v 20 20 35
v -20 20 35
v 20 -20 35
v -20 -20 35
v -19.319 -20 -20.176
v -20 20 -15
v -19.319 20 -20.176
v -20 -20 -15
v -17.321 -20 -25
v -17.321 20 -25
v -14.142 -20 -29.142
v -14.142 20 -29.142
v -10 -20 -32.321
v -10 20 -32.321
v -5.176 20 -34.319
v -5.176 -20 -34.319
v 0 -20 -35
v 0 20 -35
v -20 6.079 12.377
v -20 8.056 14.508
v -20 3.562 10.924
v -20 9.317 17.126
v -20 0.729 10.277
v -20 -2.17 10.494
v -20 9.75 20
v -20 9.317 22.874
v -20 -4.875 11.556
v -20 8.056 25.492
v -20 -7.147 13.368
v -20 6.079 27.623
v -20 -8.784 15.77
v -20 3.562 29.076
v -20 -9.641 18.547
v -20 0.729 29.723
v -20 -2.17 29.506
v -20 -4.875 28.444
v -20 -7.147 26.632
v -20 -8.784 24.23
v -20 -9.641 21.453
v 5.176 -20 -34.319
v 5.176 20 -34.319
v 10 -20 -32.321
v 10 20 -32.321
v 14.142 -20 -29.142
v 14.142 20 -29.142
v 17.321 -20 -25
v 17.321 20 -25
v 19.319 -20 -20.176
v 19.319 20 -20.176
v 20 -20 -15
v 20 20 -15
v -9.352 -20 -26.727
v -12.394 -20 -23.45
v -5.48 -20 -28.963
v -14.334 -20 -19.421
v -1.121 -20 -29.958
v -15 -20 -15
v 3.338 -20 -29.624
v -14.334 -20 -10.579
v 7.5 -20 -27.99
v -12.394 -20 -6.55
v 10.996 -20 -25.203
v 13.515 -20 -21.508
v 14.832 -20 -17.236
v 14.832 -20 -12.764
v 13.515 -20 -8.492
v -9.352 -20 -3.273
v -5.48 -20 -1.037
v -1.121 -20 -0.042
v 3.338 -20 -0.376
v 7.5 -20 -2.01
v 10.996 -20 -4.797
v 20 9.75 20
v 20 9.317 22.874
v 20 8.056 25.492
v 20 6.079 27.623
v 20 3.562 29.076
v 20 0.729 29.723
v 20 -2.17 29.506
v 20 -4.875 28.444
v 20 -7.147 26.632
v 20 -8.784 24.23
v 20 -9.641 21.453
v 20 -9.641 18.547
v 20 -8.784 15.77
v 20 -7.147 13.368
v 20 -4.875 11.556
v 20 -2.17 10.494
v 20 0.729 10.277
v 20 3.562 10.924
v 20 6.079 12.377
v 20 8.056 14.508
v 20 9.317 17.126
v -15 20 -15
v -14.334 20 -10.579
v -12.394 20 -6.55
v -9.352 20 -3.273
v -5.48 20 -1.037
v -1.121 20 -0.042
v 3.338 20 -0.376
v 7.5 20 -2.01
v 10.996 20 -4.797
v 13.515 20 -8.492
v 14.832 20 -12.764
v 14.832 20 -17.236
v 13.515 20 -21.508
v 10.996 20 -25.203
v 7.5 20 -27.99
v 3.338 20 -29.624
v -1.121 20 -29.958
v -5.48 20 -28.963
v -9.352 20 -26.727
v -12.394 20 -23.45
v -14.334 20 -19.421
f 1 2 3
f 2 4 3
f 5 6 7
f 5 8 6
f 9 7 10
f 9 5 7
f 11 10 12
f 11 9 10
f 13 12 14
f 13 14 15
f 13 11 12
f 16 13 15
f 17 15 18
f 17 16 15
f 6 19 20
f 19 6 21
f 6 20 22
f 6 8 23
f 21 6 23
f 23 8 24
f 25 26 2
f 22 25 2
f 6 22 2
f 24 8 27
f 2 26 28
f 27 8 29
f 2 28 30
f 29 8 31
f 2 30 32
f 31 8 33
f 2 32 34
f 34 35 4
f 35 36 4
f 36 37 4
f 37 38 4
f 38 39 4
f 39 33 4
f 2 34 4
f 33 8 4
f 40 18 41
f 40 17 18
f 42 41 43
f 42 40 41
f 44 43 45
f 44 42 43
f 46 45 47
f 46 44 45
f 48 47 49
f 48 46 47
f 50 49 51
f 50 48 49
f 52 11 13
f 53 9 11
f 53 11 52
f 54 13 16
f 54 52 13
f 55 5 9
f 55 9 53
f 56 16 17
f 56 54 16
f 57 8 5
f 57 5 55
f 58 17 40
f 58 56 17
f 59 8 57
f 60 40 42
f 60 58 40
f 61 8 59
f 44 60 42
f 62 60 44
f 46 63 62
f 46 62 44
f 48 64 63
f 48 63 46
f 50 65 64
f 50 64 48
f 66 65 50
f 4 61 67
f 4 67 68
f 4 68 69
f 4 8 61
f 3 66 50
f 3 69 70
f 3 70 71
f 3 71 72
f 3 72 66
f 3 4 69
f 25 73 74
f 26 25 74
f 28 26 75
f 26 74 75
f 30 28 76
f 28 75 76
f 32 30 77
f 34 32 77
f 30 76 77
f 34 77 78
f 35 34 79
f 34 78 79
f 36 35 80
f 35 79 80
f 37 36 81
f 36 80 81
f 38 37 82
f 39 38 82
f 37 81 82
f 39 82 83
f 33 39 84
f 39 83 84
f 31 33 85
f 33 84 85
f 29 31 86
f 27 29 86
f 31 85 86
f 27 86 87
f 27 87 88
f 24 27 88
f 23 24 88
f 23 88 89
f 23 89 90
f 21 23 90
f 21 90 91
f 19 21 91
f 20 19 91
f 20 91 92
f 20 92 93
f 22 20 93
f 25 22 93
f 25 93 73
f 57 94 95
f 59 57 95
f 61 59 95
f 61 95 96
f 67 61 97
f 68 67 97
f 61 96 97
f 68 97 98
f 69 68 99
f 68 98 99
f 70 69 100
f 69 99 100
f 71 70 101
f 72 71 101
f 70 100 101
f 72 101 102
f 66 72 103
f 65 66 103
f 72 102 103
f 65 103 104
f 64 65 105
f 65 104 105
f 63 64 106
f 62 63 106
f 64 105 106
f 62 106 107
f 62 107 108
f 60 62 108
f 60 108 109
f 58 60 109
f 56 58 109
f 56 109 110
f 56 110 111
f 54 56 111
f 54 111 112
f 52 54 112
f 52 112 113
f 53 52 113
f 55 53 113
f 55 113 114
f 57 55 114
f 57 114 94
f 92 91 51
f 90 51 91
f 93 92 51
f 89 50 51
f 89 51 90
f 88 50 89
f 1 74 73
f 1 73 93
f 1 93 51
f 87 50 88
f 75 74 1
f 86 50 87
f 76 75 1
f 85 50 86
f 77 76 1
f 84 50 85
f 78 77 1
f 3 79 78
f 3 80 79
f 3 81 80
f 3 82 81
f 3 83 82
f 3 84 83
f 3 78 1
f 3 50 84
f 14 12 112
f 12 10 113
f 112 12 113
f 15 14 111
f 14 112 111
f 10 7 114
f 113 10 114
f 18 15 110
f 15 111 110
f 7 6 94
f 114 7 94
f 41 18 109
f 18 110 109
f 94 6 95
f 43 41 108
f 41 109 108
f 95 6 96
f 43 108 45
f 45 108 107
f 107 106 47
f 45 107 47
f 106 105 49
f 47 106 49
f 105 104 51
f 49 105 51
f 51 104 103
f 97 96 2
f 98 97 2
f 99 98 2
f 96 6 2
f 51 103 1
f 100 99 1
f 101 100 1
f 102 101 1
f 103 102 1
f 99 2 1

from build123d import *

# Parameters (mm, degrees)
F0_W          = 40
F0_H          = 70
F1_DEPTH      = 20
F1_DEPTH_BACK = 20
F3_D          = 19.5
F5_D          = 30
F6_R          = 19.99999


# Not quite as in the source:
# - a fillet or chamfer is up to 0.001 mm smaller than in the source, because OpenCascade refuses the exact size


with BuildPart() as f1:
    # F0 (on Front) → F1 (new body, two sides)
    with BuildSketch(Plane.XZ) as f1_sk:
        Rectangle(F0_W, F0_H)
    extrude(amount=F1_DEPTH)
    extrude(f1_sk.sketch, amount=-F1_DEPTH_BACK)

    # F3 (through all)
    with Locations(Plane(origin=(-20, 0, 0), x_dir=(0, -1, 0), z_dir=(-1, 0, 0))):
        with Locations((0, 20)):
            Hole(F3_D / 2)

    # F5 (through all)
    with Locations(Plane.XZ.offset(20)):
        with Locations((0, -15)):
            Hole(F5_D / 2)

    # F6 (radius 20 in the source; OpenCascade refuses exactly that, so slightly less here)
    f6_edges = [f1.edges().sort_by_distance(p)[0] for p in [
        (20, 0, -35),
        (-20, 0, -35),
    ]]
    fillet(f6_edges, radius=F6_R)


solid = f1.part
